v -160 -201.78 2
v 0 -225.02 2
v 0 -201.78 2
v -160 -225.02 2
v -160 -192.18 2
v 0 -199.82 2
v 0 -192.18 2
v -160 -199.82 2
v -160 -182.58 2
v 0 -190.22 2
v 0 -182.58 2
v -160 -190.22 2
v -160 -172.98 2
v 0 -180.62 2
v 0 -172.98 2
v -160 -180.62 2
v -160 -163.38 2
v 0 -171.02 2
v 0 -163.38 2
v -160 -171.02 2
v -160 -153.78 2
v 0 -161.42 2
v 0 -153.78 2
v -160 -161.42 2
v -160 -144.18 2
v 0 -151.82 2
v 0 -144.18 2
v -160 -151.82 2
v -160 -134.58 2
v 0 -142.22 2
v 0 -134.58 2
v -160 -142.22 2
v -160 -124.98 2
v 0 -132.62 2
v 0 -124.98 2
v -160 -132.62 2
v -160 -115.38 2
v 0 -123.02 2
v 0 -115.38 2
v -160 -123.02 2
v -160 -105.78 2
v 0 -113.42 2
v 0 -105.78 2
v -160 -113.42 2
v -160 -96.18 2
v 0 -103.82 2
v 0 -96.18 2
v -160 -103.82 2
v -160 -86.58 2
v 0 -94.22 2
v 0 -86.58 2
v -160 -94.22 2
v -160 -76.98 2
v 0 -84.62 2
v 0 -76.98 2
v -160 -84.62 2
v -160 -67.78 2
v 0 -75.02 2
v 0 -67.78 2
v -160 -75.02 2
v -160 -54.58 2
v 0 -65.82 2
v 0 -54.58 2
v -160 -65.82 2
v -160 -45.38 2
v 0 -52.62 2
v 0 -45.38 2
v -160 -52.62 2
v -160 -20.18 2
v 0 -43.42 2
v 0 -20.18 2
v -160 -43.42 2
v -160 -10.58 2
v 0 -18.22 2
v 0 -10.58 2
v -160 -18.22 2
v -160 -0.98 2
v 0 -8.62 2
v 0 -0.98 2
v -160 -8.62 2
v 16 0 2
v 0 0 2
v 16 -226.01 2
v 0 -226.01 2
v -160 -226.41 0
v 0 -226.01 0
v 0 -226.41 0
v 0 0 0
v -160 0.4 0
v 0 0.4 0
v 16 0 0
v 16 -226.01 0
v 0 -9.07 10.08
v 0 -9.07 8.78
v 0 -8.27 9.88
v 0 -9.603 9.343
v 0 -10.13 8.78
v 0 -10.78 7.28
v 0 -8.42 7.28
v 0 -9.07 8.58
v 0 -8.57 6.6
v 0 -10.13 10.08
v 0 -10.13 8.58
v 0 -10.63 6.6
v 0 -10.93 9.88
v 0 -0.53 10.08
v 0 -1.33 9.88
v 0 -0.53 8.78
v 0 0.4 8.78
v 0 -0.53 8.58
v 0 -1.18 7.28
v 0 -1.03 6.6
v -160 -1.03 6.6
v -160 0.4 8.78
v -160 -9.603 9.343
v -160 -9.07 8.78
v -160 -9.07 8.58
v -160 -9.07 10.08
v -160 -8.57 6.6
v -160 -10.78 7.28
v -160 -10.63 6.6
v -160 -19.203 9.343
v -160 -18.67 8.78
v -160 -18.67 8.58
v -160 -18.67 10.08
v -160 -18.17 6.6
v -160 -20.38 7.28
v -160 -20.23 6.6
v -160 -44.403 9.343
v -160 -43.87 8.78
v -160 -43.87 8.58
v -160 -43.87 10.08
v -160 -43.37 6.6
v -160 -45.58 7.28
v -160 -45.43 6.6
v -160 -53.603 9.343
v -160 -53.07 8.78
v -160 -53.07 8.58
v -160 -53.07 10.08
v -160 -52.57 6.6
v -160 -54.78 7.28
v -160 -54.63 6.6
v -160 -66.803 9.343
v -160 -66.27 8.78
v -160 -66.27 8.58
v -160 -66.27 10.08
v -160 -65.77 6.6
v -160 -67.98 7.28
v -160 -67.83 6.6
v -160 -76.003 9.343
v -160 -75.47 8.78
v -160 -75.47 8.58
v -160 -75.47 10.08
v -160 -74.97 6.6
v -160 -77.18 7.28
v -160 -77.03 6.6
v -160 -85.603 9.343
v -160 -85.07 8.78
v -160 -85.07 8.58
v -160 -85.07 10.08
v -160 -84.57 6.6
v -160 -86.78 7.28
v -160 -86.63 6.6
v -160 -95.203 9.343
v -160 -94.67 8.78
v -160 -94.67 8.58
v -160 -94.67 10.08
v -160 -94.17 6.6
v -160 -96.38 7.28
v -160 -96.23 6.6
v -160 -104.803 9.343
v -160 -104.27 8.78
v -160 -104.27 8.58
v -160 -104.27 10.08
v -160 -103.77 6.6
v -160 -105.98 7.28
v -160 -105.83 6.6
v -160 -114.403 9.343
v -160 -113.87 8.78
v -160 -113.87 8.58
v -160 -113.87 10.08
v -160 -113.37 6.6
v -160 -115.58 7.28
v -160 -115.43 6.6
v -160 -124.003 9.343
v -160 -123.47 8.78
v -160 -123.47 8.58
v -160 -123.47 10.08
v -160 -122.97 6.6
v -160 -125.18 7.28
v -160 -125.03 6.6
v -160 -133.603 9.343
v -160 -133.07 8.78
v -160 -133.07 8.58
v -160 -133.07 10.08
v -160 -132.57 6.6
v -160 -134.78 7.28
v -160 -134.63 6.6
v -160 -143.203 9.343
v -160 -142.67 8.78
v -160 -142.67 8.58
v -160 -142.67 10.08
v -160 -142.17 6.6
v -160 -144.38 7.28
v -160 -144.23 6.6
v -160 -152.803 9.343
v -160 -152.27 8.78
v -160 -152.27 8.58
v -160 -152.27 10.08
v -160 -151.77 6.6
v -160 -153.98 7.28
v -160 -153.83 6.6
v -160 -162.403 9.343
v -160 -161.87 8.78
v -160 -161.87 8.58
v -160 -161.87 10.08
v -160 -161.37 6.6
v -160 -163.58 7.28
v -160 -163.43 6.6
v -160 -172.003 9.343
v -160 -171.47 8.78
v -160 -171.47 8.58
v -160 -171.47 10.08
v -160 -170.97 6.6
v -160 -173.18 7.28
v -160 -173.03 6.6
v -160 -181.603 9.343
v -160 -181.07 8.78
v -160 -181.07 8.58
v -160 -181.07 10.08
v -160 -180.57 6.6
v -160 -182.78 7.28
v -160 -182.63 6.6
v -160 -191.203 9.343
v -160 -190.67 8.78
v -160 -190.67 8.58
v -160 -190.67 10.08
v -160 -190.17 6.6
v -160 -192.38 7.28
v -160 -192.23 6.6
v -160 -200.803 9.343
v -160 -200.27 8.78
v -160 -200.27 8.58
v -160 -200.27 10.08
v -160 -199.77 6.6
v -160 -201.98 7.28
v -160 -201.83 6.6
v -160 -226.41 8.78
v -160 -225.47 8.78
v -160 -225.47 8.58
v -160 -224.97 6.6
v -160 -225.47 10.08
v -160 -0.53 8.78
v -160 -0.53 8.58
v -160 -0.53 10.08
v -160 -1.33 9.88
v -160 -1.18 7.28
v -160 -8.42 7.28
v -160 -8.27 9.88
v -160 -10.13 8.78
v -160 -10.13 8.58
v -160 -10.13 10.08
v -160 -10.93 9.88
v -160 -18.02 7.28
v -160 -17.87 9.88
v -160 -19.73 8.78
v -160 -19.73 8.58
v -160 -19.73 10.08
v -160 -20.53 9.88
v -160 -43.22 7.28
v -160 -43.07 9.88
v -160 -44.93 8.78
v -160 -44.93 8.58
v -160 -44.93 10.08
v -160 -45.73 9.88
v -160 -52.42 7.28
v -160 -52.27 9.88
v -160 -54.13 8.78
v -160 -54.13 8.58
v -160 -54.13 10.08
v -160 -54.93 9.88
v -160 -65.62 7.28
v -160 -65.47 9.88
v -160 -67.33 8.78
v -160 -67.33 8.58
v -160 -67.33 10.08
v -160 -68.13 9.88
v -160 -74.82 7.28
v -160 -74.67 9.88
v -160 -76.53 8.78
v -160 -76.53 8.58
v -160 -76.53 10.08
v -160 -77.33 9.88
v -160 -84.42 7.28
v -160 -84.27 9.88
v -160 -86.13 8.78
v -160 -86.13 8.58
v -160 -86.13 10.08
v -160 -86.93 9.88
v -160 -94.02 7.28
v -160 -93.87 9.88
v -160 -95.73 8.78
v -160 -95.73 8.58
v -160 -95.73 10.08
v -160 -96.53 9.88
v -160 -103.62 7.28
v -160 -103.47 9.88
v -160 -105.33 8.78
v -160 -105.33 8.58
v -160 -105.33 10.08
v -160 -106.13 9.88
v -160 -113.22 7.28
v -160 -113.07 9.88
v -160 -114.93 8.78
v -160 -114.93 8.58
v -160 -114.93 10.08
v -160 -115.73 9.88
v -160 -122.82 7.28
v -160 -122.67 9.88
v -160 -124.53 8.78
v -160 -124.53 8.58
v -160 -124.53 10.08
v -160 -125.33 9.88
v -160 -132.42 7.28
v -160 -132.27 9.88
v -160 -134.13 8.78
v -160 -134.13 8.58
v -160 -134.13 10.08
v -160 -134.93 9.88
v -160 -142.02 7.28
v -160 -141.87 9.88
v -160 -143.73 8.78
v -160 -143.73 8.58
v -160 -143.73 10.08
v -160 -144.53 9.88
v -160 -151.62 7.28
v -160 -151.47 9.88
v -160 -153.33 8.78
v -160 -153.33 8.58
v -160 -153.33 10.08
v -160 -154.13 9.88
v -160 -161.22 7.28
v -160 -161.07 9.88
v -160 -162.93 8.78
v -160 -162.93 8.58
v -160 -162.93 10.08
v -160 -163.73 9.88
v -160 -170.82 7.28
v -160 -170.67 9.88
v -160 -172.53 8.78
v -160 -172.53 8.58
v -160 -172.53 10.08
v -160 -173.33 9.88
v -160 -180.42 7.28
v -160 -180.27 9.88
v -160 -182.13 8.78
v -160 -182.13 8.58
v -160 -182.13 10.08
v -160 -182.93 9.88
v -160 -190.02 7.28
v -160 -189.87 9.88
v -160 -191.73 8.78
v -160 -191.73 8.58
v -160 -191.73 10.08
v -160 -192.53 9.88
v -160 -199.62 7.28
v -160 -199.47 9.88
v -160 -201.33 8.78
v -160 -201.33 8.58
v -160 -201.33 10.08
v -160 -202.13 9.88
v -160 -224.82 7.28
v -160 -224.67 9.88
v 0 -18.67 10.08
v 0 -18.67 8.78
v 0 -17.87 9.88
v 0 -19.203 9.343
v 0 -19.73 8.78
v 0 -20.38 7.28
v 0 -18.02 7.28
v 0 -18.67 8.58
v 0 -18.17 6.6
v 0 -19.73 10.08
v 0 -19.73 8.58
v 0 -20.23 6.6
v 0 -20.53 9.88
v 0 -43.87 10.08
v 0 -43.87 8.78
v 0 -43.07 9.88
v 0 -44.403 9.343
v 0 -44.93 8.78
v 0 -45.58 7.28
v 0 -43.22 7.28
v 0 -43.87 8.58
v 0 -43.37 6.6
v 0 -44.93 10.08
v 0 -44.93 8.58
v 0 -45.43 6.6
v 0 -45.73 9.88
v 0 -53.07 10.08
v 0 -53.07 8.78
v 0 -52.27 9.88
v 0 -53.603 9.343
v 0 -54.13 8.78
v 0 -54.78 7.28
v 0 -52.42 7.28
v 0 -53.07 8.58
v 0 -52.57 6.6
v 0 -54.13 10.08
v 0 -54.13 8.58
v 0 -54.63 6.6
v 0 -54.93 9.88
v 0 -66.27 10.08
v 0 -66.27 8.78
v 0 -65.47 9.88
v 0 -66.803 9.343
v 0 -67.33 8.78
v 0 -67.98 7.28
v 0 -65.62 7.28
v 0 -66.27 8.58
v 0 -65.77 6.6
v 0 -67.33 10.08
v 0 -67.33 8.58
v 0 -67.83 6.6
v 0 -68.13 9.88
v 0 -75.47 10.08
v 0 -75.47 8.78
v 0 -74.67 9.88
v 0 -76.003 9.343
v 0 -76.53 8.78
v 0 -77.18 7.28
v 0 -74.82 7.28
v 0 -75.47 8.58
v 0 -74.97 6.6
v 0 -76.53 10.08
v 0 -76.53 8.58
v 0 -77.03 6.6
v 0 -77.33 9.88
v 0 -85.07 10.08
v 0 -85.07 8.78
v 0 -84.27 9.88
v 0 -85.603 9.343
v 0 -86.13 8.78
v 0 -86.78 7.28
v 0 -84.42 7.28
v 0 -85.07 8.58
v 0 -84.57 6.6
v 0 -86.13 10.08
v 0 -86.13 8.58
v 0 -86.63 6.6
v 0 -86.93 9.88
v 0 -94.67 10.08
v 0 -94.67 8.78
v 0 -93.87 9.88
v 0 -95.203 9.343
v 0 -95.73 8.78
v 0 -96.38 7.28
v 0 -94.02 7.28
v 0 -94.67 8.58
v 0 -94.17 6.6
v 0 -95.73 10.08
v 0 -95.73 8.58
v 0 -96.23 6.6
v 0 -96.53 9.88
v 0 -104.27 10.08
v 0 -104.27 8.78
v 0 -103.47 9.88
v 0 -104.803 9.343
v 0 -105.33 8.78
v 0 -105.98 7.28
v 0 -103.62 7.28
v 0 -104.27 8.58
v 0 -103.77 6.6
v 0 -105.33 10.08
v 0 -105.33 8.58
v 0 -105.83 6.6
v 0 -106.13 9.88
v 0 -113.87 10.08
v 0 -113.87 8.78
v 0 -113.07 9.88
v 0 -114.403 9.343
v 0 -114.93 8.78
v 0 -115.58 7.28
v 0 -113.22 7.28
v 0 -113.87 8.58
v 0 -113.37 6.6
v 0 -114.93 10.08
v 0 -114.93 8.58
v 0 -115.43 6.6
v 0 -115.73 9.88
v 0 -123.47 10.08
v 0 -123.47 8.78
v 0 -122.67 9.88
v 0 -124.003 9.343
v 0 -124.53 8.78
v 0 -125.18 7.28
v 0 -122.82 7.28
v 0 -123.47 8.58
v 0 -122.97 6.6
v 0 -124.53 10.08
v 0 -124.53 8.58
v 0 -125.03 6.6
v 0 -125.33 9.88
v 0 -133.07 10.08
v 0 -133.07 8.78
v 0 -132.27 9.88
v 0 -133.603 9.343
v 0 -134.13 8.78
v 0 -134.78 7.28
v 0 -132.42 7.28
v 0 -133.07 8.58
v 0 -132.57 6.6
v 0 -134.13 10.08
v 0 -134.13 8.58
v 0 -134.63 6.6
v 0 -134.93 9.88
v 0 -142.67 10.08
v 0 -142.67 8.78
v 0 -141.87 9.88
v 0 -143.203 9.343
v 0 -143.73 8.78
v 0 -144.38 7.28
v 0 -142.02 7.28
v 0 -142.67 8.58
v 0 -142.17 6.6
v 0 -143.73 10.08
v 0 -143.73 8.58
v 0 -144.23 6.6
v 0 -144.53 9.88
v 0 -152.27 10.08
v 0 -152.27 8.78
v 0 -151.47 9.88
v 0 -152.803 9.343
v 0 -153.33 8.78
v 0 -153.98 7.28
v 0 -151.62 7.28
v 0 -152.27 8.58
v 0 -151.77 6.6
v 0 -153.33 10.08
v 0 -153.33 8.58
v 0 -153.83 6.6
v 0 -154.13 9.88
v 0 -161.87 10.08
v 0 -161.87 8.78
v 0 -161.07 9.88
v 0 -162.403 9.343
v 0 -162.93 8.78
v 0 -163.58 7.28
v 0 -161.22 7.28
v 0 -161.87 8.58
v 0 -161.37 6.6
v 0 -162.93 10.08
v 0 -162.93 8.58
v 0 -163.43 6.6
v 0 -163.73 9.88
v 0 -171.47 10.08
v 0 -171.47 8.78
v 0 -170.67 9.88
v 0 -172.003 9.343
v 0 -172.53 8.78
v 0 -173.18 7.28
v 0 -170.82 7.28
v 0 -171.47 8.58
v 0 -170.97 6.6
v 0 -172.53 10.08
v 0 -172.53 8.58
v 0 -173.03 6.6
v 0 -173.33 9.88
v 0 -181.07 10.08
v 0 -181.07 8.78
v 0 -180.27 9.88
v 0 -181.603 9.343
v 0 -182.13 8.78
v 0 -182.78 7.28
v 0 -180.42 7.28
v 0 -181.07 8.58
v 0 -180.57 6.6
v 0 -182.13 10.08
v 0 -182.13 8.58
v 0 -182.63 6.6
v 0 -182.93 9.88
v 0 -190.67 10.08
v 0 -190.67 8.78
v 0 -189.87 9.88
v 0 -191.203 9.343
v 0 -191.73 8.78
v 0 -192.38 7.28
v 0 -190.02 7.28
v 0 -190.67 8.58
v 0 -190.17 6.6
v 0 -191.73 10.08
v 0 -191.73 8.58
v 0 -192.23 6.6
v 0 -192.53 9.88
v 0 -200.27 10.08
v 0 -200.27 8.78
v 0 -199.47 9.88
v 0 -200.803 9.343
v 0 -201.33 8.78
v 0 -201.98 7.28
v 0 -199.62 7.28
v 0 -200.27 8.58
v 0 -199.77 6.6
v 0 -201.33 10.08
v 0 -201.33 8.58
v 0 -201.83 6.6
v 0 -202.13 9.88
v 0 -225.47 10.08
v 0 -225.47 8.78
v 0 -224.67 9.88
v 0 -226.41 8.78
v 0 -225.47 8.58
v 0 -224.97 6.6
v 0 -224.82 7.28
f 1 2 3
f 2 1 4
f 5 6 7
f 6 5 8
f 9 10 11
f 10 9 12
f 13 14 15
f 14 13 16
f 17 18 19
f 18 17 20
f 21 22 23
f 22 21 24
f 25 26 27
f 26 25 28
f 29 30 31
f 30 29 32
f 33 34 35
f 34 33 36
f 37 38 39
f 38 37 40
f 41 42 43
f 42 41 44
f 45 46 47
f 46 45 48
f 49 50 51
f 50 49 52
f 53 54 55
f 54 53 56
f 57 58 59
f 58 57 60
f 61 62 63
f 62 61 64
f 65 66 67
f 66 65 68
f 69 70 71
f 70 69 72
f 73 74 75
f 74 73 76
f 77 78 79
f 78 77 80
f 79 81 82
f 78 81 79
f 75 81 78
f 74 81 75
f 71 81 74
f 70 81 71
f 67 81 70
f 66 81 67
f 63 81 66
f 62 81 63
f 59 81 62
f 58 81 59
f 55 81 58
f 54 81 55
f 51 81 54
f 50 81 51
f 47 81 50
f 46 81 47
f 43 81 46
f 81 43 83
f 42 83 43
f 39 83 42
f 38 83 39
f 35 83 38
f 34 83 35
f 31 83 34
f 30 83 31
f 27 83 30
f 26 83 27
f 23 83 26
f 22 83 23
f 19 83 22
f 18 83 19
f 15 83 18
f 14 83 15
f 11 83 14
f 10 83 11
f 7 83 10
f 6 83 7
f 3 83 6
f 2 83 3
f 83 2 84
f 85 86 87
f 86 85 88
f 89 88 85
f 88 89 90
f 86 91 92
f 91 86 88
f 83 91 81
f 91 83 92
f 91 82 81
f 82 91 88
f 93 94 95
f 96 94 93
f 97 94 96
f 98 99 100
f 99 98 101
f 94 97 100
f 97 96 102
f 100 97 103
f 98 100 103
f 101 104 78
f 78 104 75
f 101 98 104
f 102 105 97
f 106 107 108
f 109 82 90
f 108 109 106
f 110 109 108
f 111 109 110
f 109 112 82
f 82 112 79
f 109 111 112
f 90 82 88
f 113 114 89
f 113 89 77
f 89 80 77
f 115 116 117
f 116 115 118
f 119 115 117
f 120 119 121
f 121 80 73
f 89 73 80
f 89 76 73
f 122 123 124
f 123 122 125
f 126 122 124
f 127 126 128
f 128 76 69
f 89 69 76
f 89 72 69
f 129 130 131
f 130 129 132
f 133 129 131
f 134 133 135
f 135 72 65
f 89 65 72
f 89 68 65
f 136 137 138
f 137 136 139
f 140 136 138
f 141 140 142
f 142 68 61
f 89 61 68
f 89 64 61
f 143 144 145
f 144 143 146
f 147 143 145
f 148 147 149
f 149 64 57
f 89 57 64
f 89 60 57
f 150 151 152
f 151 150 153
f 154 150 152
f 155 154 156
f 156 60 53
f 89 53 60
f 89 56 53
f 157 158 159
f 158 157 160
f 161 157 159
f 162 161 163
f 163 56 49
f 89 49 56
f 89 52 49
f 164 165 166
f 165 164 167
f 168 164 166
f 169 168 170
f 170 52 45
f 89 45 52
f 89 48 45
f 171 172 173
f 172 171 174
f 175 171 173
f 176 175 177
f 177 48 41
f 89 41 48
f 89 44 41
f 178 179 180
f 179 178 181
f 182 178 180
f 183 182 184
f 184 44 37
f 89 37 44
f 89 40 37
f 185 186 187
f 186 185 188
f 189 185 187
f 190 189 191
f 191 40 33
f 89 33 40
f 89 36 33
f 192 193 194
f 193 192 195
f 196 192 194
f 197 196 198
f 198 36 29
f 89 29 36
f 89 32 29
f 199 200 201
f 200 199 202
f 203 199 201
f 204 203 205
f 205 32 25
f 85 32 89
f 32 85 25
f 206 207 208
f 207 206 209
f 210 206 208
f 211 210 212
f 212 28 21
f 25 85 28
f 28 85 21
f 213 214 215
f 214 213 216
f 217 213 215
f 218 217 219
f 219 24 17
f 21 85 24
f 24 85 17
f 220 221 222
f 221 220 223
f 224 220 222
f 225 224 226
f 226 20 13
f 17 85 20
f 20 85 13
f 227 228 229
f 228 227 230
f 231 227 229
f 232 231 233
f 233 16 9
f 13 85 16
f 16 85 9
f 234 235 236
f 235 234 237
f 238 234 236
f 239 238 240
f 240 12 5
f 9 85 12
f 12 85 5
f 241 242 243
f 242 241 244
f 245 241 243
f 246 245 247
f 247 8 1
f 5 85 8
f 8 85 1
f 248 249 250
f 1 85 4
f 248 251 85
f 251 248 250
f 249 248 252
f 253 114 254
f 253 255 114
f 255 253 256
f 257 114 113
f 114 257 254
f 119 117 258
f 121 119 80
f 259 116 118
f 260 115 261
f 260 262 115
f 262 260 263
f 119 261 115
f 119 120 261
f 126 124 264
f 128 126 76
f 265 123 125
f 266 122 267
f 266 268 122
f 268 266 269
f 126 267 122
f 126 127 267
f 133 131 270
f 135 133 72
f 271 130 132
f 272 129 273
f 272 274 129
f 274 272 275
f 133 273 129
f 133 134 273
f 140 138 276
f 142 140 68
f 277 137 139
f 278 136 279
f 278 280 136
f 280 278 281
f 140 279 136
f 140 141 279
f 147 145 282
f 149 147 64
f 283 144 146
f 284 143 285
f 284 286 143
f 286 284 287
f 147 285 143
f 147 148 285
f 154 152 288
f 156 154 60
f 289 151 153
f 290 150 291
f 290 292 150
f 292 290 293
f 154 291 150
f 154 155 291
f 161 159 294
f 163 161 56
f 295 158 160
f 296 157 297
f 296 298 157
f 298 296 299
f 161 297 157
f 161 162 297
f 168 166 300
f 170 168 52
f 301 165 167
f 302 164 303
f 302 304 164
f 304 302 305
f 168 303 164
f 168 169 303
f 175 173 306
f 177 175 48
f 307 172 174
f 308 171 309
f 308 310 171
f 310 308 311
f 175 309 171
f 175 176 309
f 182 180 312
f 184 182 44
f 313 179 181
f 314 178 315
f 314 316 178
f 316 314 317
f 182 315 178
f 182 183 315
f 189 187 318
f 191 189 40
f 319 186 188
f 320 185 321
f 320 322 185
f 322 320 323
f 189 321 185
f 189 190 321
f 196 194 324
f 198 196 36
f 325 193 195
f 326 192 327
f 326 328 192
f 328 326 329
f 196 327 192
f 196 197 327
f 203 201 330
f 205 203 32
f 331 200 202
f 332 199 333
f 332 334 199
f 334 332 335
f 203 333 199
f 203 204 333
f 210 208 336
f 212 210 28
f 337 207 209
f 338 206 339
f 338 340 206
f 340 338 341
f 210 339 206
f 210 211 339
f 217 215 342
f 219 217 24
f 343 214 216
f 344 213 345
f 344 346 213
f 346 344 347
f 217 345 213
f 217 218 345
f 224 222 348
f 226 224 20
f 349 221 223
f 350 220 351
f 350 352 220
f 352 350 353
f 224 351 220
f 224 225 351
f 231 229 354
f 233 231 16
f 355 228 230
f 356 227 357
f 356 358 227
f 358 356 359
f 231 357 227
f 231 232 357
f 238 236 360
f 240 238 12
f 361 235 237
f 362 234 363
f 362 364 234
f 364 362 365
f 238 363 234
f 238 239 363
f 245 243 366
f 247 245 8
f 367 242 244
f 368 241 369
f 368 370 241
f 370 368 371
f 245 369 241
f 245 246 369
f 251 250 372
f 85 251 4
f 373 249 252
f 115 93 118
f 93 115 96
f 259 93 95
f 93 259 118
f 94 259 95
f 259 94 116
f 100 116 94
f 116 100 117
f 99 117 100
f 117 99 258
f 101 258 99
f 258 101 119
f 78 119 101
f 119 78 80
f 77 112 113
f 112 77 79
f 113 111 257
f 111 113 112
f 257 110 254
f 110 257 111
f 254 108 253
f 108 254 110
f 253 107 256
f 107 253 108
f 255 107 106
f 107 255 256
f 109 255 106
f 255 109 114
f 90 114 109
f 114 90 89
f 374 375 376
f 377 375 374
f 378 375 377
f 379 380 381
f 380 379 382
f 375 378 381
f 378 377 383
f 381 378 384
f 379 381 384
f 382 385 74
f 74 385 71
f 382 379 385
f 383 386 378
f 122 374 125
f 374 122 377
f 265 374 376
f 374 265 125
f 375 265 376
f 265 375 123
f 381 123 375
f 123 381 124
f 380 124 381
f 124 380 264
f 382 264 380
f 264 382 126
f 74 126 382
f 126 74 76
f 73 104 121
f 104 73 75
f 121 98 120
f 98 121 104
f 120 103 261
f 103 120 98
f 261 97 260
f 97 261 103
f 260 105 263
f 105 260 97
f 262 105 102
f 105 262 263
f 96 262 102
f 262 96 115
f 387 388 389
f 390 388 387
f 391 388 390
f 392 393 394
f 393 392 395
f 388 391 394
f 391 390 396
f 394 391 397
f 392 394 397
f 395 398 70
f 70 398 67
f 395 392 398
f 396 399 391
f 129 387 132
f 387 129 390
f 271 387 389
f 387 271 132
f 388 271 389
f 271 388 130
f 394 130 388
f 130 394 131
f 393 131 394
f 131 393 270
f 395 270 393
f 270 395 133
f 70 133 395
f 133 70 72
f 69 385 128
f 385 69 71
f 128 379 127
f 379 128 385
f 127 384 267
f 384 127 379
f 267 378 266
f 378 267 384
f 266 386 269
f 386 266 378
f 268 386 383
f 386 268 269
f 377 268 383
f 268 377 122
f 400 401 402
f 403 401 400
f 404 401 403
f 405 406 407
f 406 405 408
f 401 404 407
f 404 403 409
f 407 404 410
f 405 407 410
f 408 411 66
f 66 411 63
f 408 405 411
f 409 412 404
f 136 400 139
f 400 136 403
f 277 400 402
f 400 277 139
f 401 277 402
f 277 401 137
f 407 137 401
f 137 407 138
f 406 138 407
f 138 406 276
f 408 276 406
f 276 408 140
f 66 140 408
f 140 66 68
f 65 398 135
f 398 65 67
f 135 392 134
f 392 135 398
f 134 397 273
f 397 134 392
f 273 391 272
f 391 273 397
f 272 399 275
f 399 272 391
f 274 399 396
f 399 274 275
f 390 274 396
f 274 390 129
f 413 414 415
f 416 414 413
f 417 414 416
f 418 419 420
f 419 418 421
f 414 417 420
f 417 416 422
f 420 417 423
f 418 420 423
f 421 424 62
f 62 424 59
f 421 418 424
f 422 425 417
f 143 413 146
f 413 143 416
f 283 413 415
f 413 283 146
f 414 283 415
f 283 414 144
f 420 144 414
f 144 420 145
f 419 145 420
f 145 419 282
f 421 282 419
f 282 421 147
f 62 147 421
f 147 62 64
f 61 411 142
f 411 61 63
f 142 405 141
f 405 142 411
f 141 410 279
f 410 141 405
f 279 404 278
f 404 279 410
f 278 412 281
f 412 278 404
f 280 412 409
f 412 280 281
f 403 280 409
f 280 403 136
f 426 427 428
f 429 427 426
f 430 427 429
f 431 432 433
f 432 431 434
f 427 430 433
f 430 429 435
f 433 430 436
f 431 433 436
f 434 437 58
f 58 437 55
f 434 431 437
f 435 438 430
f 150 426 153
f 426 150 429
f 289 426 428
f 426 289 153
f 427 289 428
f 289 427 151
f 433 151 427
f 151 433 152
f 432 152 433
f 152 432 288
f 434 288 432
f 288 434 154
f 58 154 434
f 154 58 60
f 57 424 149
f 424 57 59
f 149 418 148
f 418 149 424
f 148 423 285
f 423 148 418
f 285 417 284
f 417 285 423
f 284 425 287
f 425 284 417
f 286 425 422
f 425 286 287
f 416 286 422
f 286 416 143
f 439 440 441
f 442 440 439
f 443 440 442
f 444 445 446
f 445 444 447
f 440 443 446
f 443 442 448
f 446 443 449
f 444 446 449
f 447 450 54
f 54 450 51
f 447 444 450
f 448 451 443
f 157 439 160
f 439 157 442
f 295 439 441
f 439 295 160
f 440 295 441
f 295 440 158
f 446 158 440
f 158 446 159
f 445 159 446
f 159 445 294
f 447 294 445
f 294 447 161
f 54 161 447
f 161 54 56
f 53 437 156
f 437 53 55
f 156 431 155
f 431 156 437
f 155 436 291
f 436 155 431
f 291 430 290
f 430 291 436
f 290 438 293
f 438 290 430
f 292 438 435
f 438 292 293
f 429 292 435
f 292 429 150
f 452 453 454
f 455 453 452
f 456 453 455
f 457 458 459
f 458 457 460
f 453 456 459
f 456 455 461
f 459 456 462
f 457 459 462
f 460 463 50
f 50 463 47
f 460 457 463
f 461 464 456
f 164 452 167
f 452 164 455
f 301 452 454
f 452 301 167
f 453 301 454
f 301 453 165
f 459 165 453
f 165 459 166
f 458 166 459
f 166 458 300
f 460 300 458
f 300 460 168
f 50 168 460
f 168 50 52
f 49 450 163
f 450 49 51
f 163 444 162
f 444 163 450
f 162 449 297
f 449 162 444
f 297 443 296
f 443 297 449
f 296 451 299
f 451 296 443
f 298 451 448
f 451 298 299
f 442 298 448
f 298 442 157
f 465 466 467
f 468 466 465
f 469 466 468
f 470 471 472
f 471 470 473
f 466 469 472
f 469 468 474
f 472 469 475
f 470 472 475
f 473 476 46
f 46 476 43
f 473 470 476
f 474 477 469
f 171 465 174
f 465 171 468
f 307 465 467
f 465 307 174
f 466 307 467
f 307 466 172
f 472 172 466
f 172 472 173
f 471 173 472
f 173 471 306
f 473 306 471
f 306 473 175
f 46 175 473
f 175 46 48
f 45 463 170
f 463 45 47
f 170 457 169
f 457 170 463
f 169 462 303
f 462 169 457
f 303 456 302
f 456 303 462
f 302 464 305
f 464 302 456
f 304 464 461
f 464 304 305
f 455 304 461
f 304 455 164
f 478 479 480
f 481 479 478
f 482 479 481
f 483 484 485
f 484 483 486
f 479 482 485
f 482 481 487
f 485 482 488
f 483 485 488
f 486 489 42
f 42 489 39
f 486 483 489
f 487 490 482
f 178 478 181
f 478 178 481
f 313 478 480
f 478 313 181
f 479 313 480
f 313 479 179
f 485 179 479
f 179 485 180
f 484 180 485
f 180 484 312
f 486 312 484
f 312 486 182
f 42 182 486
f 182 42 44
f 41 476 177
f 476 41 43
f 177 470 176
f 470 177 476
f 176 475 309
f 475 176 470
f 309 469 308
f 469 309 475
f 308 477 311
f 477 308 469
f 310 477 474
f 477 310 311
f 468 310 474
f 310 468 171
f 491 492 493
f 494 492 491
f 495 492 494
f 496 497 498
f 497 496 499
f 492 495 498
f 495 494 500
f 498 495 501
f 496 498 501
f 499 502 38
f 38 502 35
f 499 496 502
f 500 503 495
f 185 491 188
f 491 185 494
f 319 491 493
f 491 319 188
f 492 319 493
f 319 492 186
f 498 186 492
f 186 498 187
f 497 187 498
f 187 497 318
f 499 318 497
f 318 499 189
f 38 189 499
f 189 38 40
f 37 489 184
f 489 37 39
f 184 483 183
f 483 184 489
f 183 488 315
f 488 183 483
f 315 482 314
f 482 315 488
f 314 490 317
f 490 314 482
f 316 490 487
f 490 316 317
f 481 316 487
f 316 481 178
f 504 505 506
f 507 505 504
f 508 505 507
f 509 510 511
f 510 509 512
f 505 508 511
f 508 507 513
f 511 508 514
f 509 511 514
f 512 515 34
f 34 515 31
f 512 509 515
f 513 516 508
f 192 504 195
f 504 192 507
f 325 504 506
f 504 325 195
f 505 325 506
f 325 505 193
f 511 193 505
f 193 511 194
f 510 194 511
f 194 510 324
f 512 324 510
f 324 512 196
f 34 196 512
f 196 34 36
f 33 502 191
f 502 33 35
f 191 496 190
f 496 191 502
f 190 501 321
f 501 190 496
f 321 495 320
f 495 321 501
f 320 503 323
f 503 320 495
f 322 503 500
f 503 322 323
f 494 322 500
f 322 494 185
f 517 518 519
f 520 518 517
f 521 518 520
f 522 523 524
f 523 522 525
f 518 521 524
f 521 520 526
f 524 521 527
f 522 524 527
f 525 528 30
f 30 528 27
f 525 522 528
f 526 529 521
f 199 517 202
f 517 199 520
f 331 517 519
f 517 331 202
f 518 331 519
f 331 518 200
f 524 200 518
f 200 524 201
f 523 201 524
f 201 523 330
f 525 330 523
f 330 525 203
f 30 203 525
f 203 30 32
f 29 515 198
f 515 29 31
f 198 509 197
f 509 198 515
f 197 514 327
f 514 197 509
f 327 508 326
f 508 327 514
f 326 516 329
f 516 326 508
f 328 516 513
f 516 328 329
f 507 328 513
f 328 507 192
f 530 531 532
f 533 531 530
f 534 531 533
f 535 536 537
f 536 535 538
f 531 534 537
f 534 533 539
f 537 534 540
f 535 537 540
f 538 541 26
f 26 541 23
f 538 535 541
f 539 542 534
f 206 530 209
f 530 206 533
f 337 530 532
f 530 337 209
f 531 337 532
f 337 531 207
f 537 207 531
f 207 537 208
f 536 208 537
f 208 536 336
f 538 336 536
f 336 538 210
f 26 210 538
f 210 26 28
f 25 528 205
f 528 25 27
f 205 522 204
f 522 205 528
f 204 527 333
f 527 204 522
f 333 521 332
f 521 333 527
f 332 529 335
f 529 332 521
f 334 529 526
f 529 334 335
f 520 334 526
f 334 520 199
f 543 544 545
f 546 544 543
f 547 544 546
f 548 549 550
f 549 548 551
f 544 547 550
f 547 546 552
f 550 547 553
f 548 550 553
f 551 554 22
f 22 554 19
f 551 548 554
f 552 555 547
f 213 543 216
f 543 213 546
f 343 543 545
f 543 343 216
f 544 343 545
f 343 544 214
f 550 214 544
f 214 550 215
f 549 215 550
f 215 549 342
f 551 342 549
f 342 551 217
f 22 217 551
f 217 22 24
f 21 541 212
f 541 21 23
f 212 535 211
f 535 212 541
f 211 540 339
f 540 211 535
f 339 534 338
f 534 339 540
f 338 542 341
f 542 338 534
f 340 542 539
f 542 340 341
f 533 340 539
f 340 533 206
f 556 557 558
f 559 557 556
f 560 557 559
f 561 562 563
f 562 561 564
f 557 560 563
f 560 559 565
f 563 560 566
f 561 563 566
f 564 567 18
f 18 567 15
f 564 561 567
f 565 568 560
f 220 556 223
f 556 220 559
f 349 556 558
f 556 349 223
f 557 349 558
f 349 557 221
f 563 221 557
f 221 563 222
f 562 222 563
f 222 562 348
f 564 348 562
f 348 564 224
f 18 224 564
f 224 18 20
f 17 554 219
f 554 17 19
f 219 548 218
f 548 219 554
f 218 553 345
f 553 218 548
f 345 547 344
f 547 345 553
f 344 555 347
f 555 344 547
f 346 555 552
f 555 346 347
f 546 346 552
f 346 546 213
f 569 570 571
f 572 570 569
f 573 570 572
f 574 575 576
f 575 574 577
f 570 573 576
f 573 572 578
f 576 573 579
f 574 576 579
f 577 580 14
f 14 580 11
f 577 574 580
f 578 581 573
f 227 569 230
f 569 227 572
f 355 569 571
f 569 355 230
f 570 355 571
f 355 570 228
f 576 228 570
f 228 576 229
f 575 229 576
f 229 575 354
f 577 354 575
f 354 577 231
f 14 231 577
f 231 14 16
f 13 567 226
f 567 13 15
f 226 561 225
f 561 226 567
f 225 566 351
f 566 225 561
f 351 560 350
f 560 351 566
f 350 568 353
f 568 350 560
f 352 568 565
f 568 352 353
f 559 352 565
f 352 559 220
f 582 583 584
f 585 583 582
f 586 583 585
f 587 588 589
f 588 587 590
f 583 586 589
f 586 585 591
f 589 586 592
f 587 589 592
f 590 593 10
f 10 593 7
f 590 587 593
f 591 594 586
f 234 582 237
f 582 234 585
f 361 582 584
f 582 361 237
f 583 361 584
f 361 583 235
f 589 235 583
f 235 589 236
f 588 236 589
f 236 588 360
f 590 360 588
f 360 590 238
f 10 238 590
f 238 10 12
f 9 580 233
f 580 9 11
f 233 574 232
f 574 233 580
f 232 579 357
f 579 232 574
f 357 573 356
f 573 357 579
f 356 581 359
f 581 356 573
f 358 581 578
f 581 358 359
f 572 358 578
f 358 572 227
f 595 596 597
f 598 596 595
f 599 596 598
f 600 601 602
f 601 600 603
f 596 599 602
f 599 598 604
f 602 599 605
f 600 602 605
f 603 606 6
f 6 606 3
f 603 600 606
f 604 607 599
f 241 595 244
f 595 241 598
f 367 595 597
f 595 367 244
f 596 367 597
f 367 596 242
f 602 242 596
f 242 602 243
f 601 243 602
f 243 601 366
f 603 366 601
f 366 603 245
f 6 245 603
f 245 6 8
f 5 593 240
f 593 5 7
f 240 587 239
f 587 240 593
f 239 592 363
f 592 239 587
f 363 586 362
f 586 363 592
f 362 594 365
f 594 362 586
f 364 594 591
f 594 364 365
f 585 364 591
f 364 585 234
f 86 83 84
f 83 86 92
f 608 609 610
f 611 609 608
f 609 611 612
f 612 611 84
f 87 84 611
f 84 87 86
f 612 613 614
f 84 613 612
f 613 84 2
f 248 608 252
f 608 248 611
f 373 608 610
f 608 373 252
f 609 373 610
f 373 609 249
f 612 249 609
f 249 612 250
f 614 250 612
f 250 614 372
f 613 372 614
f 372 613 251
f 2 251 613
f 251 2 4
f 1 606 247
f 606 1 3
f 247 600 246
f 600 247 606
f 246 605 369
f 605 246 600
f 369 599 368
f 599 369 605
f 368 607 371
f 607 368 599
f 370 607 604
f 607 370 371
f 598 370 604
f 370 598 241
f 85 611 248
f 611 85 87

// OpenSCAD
/*
 * Copyright (C) 2019-2020 makr@makr.zone
 *
 * This 3D printed feeder is inteded to be used together with the "BlindsFeeder" feeder in OpenPNP. 
 *
 * This file is part of OpenPnP. 
 *
 * OpenPnP is free software: you can redistribute it and/or modify it under the terms of the GNU
 * General Public License as published by the Free Software Foundation, either version 3 of the
 * License, or (at your option) any later version.
 * 
 * OpenPnP is distributed in the hope that it will be useful, but WITHOUT ANY WARRANTY; without even
 * the implied warranty of MERCHANTABILITY or FITNESS FOR A PARTICULAR PURPOSE. See the GNU General
 * Public License for more details.
 * 
 * You should have received a copy of the GNU General Public License along with OpenPnP. If not, see
 * <http://www.gnu.org/licenses/>.
 * 
 * For more information about OpenPnP visit http://openpnp.org
 */
 
 debug_view = true;
 label_view = false;
 tape_height=4.6;

// Include the BlindsFeeder Library. 
// To learn the details about available parameters, please read the extensive comments in the library file. 
// The library also defines some 3D printing constants that you might want to tune along with some advice 
// how to setup your slicer. 
include <BlindsFeeder-Library.scad>

// All dimensions in Millimeters.

// Let's create some tape definitions
// Again, please read the extensive commentPocket pitchs in the library file to learn what 
// parameters are avaialable and what exactly they mean and do. 
tape0402 = TapeDefinition(
    tape_width=8-0.4, // smd
    tape_thickness=tape_height,
    // Pitch of the pockets in the tape. Use 2mm or multiples of 4mm.
    pocket_pitch=2,  // Taschenplatz
    // Pocket width across the tape.
    pocket_width=2.4,
    // Tape play. Use this to adjust the precise tape width and the play for print imperfections.
    tape_play=-0.03,
    // Horizontal per-side play of the cover to allow for imperfections of the print.
    cover_play=0.08);

tape0401 = TapeDefinition( // für schmalle tapes
    tape_width=24-0.8,
    tape_thickness=tape_height,
    // Pitch of the pockets in the tape. Use 2mm or multiples of 4mm.
    pocket_pitch=2,  // Taschenplatz
    // Pocket width across the tape.
    pocket_width=2.4,
    // Tape play. Use this to adjust the precise tape width and the play for print imperfections.
    tape_play=-0.03,
    // Horizontal per-side play of the cover to allow for imperfections of the print.
    cover_play=0.08);

tape0403 = TapeDefinition( // für schmalle tapes
    tape_width=8-0.8,
    tape_thickness=tape_height,
    // Pitch of the pockets in the tape. Use 2mm or multiples of 4mm.
    pocket_pitch=2,  // Taschenplatz
    // Pocket width across the tape.
    pocket_width=2.4,
    // Tape play. Use this to adjust the precise tape width and the play for print imperfections.
    tape_play=-0.03,
    // Horizontal per-side play of the cover to allow for imperfections of the print.
    cover_play=0.08);

tape0404 = TapeDefinition( // für schmalle tapes
    tape_width=12-0.8,
    tape_thickness=tape_height,
    // Pitch of the pockets in the tape. Use 2mm or multiples of 4mm.
    pocket_pitch=2,  // Taschenplatz
    // Pocket width across the tape.
    pocket_width=2.4,
    // Tape play. Use this to adjust the precise tape width and the play for print imperfections.
    tape_play=-0.03,
    // Horizontal per-side play of the cover to allow for imperfections of the print.
    cover_play=0.08);

tape0405 = TapeDefinition( // für schmalle tapes
    tape_width=16-0.8,
    tape_thickness=tape_height,
    // Pitch of the pockets in the tape. Use 2mm or multiples of 4mm.
    pocket_pitch=2,  // Taschenplatz
    // Pocket width across the tape.
    pocket_width=2.4,
    // Tape play. Use this to adjust the precise tape width and the play for print imperfections.
    tape_play=-0.03,
    // Horizontal per-side play of the cover to allow for imperfections of the print.
    cover_play=0.08);

// Create the feeder array with these tape definitions.
// Note the BlindsFeeder has a myriad of parameters you can tweak, the ones used here are just the most important. 
// See the Library file to learn more. 
rotate([0, 0, 180]) BlindsFeeder(
    // Tape length from feeder edge to edge (not including the margin), usually multiples of 4mm. 
    // Other values are supported if you manually adjust the default 2mm edge distance in the OpenPNP feeder.
    tape_length=160,
    
    // For OCR, add a margin at the begin of the tape.
    margin_length_begin=16,
    
    // Define the lanes with number, tape definitinon, pardocht label (String array with multiple lines).
    arrayed_tape_lanes=      [
        LaneDefinition(1, tape0402,   ["C269541"]), 
        LaneDefinition(1, tape0402,   ["C269541"]), 
         LaneDefinition(1, tape0401,   ["C165948"]), // usb 
        LaneDefinition(1, tape0403,   ["C15643"]), // black
        LaneDefinition(1, tape0404,   ["C7813"]),  // black
        LaneDefinition(1, tape0403,   ["C264432"]), // black
        LaneDefinition(1, tape0402,   ["C282732"]), 
        LaneDefinition(1, tape0402,   ["C282732"]), 
        LaneDefinition(1, tape0402,   ["C282732"]), 
        LaneDefinition(1, tape0402,   ["C352254"]), 
        LaneDefinition(1, tape0402,   ["C352254"]), 
        LaneDefinition(1, tape0402,   ["C17024"]), 
        LaneDefinition(1, tape0402,   ["C105173"]), 
        LaneDefinition(1, tape0402,   ["C105173"]), 
        LaneDefinition(1, tape0402,   ["C95978"]), 
        LaneDefinition(1, tape0402,   ["C270124"]), 
        LaneDefinition(1, tape0402,   ["C270124"]), 
        LaneDefinition(1, tape0402,   ["C24123"]), 
        LaneDefinition(1, tape0402,   ["C25611"]), 
  //      LaneDefinition(1, tape0405,   ["C6057"]), 
       LaneDefinition(1, tape0401,   ["C165948"]), // usb 

        ],
    
    label=label_view,
    tray=(! label_view),
  //  cover=(! label_view),
    debug=debug_view
);

//difference(){
//translate([-20, 0, 0]) cube([14, 14, 2]);
//translate([-13, 7, 0]) cylinder(5.3, 2.65, 3);
//}
